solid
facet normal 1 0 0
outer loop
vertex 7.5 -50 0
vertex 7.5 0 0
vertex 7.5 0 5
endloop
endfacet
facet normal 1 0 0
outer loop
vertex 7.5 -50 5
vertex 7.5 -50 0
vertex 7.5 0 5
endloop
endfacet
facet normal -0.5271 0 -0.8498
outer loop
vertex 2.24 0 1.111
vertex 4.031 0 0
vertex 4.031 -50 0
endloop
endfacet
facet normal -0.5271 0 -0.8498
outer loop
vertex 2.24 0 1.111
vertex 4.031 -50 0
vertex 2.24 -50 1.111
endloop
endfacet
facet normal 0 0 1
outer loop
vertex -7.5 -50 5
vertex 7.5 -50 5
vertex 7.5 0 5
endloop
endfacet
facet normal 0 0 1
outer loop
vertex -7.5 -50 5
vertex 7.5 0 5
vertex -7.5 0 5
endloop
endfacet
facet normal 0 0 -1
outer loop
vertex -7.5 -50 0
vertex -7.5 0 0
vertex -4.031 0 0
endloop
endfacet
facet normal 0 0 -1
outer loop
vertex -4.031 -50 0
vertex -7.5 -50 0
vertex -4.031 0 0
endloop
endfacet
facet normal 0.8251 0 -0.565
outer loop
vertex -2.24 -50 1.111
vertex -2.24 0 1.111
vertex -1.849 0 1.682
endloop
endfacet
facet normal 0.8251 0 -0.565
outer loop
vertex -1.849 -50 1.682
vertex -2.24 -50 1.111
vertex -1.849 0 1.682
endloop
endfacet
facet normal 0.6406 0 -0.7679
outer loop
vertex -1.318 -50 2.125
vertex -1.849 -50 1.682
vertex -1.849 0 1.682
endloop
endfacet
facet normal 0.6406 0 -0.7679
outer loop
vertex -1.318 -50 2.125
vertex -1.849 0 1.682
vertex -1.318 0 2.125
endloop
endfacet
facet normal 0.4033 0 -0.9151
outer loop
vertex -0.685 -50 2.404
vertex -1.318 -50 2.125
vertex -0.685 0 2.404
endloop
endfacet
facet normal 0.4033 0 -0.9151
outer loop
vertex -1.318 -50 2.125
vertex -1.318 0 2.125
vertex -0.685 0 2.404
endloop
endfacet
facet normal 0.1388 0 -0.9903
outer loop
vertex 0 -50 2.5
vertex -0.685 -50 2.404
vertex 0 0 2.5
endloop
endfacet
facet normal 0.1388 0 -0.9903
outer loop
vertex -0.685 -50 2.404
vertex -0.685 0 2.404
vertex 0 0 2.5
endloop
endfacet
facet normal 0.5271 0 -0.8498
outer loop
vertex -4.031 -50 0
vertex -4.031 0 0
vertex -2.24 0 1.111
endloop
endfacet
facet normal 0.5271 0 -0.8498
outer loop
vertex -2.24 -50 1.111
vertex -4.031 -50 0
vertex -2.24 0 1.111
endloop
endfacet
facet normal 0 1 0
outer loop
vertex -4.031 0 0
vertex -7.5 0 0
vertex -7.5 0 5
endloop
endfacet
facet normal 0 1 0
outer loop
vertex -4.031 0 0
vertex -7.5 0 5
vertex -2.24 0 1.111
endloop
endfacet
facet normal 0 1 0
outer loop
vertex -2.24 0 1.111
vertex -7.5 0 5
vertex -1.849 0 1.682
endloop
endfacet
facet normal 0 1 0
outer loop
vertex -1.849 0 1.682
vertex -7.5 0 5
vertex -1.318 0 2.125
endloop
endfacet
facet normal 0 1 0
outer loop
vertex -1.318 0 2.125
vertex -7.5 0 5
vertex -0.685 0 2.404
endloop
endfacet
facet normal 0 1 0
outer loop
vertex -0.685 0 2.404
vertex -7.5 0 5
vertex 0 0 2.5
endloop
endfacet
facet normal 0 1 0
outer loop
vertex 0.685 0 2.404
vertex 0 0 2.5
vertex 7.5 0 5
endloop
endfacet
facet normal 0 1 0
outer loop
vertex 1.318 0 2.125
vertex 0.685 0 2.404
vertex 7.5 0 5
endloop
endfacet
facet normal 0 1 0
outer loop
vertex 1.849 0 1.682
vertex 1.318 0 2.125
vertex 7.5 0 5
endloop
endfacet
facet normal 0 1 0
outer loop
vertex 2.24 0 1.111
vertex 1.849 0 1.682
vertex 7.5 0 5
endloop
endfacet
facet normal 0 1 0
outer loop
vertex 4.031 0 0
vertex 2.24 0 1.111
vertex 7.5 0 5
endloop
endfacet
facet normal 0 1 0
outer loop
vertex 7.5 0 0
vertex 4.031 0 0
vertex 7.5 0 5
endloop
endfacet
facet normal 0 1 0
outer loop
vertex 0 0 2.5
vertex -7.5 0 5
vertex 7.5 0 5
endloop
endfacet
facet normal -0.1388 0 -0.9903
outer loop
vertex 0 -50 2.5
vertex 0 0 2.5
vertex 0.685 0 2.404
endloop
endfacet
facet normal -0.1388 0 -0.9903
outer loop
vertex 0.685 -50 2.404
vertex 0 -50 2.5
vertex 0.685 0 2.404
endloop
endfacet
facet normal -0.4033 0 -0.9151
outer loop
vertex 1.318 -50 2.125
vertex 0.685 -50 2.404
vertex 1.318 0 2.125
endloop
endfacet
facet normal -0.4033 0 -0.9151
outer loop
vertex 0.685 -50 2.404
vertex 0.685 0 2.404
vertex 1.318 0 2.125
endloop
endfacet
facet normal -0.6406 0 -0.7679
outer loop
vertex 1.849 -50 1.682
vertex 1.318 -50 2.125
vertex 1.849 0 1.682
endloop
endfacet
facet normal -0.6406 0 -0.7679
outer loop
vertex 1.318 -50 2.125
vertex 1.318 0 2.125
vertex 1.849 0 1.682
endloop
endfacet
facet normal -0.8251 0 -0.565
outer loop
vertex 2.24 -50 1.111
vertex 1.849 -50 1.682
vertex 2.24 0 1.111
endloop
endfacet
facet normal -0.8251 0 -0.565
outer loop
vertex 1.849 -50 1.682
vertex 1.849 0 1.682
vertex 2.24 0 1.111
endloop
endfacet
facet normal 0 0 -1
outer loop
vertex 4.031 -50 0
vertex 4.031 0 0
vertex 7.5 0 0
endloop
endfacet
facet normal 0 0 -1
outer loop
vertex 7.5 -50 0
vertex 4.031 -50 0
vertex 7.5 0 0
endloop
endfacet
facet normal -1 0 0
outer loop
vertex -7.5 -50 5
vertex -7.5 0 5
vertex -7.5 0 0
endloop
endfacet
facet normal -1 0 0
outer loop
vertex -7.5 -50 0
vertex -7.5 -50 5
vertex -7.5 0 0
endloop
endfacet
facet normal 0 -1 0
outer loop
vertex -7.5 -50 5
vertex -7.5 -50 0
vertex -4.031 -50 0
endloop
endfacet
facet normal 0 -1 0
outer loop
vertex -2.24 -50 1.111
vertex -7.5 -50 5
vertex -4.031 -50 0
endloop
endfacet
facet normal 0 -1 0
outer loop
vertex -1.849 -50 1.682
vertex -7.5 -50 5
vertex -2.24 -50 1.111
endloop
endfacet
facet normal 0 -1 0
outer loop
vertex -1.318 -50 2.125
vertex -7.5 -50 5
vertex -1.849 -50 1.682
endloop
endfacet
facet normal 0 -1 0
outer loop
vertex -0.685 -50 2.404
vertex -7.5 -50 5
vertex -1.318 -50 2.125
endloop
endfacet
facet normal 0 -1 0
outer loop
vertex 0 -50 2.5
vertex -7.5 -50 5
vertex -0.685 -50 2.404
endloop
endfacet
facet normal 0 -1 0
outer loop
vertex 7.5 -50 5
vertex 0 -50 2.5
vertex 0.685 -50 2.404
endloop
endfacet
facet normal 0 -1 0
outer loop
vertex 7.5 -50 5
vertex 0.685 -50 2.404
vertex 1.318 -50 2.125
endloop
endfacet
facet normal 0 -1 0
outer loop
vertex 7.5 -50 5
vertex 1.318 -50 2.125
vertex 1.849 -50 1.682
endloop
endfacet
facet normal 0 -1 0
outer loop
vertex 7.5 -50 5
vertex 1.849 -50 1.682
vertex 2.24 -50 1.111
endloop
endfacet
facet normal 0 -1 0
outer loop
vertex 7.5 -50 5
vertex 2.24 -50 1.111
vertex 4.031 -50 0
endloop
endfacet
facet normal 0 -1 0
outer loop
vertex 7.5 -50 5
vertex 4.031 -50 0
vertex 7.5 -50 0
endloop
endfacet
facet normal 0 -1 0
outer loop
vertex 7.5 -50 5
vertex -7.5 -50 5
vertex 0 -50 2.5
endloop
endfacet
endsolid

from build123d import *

# Parameters (mm, degrees)
F1_DEPTH    = 50
F2_T1_DEPTH = 57.9983578358


# Not quite as in the source:
# - a fillet or chamfer that OpenCascade refuses, or shapes differently, is made with other operations: its cross-section is extruded or revolved along the edge and cut away or added


with BuildPart() as f1:
    # F0 (on Front) → F1 (new body)
    with BuildSketch(Plane.XZ):
        with BuildLine():
            Line((7.5, 5), (0, 5))
            Line((0, 5), (-7.5, 5))
            Line((-7.5, 5), (-7.5, 0))
            Line((-7.5, 0), (-2.5, 0))
            ThreePointArc((-2.5, 0), (-1.767766953, 1.767766953), (0, 2.5))
            ThreePointArc((0, 2.5), (1.767766953, 1.767766953), (2.5, 0))
            Line((2.5, 0), (7.5, 0))
            Line((7.5, 0), (7.5, 5))
        make_face()
    extrude(amount=F1_DEPTH)

    # F2: chamfer of 2 on 2 edges, made by hand

    # F2_s2 → F2_t1 (cut)
    with BuildSketch(Plane.XZ.offset(-3.9991789179)):
        with BuildLine():
            Line((-4.0311288741, 0), (-2.2395160412, 1.1111111111))
            ThreePointArc((-2.2395160412, 1.1111111111), (-2.4271314798, 0.5991934409), (-2.5, 0))
            Line((-2.5, 0), (-4.0311288741, 0))
        make_face()
        with BuildLine():
            Line((4.0311288741, 0), (2.2395160412, 1.1111111111))
            ThreePointArc((2.2395160412, 1.1111111111), (2.4271314798, 0.5991934409), (2.5, 0))
            Line((2.5, 0), (4.0311288741, 0))
        make_face()
    extrude(amount=F2_T1_DEPTH, mode=Mode.SUBTRACT)


solid = f1.part
